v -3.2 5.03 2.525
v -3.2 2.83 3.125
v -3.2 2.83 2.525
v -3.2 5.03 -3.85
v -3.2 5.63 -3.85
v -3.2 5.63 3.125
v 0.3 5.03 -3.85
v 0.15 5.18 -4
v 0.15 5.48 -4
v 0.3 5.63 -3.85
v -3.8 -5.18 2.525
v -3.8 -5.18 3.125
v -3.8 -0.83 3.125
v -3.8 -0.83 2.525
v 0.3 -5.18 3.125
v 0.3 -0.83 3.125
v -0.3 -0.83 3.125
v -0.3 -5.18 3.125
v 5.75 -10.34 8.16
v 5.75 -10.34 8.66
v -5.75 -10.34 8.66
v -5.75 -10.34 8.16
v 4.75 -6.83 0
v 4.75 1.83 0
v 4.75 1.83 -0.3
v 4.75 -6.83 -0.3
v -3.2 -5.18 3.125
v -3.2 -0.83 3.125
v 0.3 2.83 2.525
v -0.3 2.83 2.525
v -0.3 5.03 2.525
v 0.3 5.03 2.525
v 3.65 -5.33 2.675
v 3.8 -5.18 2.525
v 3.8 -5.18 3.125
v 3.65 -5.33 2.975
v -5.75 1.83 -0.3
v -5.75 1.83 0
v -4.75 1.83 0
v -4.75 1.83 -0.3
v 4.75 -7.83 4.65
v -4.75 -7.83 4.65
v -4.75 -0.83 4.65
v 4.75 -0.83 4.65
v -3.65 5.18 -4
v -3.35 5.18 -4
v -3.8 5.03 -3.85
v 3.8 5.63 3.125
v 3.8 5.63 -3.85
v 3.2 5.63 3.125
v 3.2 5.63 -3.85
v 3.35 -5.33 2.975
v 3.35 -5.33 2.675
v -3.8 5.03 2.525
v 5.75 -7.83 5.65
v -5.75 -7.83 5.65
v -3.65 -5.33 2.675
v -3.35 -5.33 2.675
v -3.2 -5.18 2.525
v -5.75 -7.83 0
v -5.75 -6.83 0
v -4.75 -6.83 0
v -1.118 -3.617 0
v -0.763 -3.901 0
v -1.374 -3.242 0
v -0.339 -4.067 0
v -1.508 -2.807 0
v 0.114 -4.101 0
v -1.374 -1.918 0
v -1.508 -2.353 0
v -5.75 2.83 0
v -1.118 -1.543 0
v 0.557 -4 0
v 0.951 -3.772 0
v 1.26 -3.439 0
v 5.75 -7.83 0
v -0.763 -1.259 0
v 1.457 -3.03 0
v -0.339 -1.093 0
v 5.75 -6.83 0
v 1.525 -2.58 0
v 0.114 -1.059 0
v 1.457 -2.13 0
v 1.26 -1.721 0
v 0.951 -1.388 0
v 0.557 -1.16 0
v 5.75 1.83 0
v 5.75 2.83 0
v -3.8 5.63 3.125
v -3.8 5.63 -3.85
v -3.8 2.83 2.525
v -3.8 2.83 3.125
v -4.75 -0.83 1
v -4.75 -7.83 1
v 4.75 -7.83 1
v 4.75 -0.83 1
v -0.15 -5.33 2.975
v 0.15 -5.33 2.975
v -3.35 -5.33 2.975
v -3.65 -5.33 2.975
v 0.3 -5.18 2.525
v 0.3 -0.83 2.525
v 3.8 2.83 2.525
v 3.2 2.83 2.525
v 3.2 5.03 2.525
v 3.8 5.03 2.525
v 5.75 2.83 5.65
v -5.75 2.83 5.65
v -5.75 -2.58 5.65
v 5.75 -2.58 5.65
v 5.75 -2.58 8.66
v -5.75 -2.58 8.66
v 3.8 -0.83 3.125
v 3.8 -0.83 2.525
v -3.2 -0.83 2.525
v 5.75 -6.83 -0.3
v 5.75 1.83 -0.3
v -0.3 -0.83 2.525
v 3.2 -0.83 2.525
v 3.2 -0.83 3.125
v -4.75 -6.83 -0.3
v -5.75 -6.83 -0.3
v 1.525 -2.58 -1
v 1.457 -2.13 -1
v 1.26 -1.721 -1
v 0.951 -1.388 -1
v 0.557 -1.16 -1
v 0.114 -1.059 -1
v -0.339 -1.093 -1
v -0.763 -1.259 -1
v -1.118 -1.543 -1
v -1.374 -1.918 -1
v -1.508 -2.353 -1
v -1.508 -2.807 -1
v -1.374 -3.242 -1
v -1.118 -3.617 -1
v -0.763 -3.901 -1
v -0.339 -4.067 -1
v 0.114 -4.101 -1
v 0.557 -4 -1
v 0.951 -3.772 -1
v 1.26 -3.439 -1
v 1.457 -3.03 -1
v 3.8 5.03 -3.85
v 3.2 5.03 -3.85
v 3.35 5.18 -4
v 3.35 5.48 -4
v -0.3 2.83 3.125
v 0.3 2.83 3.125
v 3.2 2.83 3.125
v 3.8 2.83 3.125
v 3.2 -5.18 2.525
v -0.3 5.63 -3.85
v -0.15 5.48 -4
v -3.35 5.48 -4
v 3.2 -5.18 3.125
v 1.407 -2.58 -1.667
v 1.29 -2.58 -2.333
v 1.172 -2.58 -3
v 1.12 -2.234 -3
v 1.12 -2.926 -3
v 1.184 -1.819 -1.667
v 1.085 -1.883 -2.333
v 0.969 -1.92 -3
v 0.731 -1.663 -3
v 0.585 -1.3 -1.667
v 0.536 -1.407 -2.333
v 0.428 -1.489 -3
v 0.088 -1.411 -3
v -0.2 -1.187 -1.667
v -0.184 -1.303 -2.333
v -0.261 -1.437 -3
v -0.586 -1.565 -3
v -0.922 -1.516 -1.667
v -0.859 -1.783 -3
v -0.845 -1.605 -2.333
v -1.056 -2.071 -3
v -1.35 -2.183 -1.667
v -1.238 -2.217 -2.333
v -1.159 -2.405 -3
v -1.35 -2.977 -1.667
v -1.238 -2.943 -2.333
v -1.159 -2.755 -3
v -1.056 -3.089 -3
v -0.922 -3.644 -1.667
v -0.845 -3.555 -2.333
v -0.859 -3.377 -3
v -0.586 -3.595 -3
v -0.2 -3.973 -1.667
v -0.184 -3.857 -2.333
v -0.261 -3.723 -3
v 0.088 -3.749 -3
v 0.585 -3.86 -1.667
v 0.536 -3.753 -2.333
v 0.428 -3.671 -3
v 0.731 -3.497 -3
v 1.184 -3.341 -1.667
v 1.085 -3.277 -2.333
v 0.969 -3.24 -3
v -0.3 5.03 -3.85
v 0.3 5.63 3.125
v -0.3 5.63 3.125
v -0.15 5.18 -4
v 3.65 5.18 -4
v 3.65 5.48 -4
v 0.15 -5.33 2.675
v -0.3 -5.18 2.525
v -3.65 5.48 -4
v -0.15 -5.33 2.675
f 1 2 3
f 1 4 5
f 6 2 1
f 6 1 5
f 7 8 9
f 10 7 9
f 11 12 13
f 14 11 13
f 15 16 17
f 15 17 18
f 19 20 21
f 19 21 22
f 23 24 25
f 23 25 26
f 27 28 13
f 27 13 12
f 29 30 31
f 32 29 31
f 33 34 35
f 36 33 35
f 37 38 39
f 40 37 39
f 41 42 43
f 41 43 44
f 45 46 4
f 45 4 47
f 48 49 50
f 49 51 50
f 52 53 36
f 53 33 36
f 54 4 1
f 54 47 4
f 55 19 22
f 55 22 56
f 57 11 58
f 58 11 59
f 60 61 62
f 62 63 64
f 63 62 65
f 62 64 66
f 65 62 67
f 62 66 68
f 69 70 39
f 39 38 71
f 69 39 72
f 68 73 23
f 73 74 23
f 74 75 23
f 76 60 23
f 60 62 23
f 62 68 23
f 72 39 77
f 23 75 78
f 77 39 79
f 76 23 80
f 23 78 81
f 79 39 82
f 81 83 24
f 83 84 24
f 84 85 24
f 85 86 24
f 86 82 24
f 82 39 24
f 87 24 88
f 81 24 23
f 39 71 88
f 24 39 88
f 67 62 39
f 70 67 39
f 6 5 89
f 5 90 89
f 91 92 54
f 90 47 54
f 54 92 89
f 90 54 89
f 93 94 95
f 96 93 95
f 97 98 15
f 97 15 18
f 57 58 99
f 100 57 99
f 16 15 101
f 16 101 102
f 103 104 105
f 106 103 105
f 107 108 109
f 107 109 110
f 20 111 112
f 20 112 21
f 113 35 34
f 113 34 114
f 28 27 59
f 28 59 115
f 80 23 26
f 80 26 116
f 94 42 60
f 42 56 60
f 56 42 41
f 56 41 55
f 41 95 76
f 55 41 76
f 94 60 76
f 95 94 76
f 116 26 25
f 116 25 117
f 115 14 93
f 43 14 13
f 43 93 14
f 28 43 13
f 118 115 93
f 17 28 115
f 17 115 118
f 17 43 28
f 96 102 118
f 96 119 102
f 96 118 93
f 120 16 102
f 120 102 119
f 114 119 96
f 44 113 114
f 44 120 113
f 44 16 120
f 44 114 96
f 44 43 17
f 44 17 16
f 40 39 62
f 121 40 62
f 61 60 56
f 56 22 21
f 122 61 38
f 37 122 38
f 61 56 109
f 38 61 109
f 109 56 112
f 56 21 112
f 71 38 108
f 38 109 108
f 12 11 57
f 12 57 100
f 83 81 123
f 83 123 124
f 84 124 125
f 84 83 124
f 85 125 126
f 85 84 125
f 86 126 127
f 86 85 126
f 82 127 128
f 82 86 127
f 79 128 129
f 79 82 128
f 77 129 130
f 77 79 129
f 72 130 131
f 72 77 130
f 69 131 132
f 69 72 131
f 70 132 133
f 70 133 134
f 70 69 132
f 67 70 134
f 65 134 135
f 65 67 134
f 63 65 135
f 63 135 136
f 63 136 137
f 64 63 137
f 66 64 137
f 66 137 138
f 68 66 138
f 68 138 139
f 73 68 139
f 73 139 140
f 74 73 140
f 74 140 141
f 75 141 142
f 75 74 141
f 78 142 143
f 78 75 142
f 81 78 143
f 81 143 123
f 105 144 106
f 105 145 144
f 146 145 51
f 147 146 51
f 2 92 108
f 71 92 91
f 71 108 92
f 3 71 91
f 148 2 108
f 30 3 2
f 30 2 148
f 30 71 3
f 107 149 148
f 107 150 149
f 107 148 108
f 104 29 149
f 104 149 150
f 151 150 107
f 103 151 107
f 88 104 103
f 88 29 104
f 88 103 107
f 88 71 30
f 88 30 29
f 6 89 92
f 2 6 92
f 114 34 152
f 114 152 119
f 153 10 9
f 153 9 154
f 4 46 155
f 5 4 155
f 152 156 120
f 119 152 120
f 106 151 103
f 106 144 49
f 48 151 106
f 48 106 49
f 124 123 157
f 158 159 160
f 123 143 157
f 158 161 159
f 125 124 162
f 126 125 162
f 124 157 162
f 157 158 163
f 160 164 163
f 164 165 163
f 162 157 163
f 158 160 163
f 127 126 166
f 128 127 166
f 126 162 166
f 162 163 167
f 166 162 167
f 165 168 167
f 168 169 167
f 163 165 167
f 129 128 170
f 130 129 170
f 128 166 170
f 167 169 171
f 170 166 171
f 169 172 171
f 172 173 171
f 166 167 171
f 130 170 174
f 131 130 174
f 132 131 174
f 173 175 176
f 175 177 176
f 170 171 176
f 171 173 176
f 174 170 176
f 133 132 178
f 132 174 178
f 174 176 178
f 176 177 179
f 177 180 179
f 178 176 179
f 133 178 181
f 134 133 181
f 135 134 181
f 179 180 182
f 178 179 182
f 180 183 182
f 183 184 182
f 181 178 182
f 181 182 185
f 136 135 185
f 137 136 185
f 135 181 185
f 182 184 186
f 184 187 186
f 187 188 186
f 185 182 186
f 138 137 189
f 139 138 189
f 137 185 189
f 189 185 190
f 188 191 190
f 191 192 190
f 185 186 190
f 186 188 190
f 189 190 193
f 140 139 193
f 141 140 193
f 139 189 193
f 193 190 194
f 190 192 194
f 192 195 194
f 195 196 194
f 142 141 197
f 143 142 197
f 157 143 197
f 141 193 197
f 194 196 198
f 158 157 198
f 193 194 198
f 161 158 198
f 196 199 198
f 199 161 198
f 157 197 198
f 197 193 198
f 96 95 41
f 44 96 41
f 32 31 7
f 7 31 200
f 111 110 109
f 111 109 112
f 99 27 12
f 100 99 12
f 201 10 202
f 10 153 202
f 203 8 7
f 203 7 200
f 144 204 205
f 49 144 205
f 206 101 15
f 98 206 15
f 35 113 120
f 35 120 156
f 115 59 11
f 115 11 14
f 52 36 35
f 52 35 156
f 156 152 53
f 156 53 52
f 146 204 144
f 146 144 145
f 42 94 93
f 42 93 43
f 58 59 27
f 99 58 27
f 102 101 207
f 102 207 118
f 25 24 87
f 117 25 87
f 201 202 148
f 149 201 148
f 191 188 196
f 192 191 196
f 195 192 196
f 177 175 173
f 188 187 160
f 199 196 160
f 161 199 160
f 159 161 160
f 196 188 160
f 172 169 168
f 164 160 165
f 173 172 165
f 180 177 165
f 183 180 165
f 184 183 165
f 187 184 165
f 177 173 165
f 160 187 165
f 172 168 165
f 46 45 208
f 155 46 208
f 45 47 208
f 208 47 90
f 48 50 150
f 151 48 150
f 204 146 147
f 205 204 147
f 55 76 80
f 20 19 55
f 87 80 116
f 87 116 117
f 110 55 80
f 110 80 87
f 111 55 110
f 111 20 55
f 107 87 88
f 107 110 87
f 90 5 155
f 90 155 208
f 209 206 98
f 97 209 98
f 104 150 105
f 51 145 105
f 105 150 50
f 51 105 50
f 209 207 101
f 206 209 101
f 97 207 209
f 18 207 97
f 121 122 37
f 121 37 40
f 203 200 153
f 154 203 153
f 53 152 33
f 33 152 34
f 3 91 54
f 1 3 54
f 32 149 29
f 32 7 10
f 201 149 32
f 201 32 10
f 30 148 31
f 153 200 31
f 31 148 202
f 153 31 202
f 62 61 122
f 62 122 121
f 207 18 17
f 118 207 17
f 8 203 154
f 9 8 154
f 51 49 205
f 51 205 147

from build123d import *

# Parameters (mm, degrees)
F0_W           = 11.5
F0_H           = 10.66
F0_R           = 1.525
F1_DEPTH       = 5.65
F2_DEPTH       = 3
F3_SIZE2       = 0.3526539614
F3_SIZE        = 2
F4_W           = 9.5
F4_H           = 3.65
F5_DEPTH       = 7
F7_W           = 4.5
F7_H           = 0.6
F7_W_2         = 0.6
F7_H_2         = 4
F7_H_3         = 2.525
F7_W_3         = 5.86
F8_DEPTH       = 0.3
F8_DEPTH_BACK  = 0.3
F10_W          = 10.36
F10_H          = 0.6
F10_W_2        = 0.6
F10_H_2        = 6.525
F11_DEPTH      = 0.3
F11_DEPTH_BACK = 0.3
F13_W          = 10.36
F13_H          = 0.6
F13_W_2        = 0.6
F13_H_2        = 6.525
F14_DEPTH      = 0.3
F14_DEPTH_BACK = 0.3
F15_SIZE       = 0.15
F16_W          = 1
F16_H          = 8.66
F17_DEPTH      = 0.3
F19_DEPTH      = 11.5


with BuildPart() as f1:
    # F0 (on Top) → F1 (new body)
    with BuildSketch(Plane.XY):
        with Locations((0, -2.5)):
            Rectangle(F0_W, F0_H)
        with Locations((0, -2.58)):
            Circle(F0_R, mode=Mode.SUBTRACT)
        with Locations((0, -2.58)):
            Circle(F0_R)
    extrude(amount=F1_DEPTH)

    # F0 (on Top) → F2 (join)
    with BuildSketch(Plane.XY):
        with Locations((0, -2.58)):
            Circle(F0_R)
    extrude(amount=-F2_DEPTH)

    # F3
    f3_edges = [f1.edges().sort_by_distance(p)[0] for p in [
        (-1.525, -2.58, -3),
    ]]
    f3_side = f1.faces().sort_by_distance((-1.525, -2.58, -1.5))[0]
    chamfer(f3_edges, length=F3_SIZE, length2=F3_SIZE2, reference=f3_side)

    # F4 (on face) → F5 (cut)
    with BuildSketch(Plane.XZ.offset(7.83)):
        with Locations((0, 2.825)):
            Rectangle(F4_W, F4_H)
    extrude(amount=-F5_DEPTH, mode=Mode.SUBTRACT)

    # F7 (on mid) → F8 (join, two sides)
    with BuildSketch(Plane.YZ) as f8_sk:
        with Locations((-3.08, 2.825)):
            Rectangle(F7_W, F7_H)
        with Locations((5.33, 2.825)):
            Rectangle(F7_W_2, F7_H)
        with Locations((5.33, -2)):
            Rectangle(F7_W_2, F7_H_2)
        with Locations((5.33, 1.2625)):
            Rectangle(F7_W_2, F7_H_3)
        with Locations((2.1, 2.825)):
            Rectangle(F7_W_3, F7_H)
    extrude(amount=F8_DEPTH)
    extrude(f8_sk.sketch, amount=-F8_DEPTH_BACK)

    # F10 (on offset) → F11 (join, two sides)
    with BuildSketch(Plane.YZ.offset(3.5)) as f11_sk:
        with Locations((-0.15, 2.825)):
            Rectangle(F10_W, F10_H)
        with Locations((5.33, 2.825)):
            Rectangle(F10_W_2, F10_H)
        with Locations((5.33, -0.7375)):
            Rectangle(F10_W_2, F10_H_2)
    extrude(amount=F11_DEPTH)
    extrude(f11_sk.sketch, amount=-F11_DEPTH_BACK)

    # F13 (on offset) → F14 (join, two sides)
    with BuildSketch(Plane.YZ.offset(-3.5)) as f14_sk:
        with Locations((-0.15, 2.825)):
            Rectangle(F13_W, F13_H)
        with Locations((5.33, 2.825)):
            Rectangle(F13_W_2, F13_H)
        with Locations((5.33, -0.7375)):
            Rectangle(F13_W_2, F13_H_2)
    extrude(amount=F14_DEPTH)
    extrude(f14_sk.sketch, amount=-F14_DEPTH_BACK)

    # F15
    f15_edges = [f1.edges().sort_by_distance(p)[0] for p in [
        (-3.5, 5.03, -4),
        (-3.8, 5.33, -4),
        (-3.5, 5.63, -4),
        (-3.2, 5.33, -4),
        (-0.3, 5.33, -4),
        (0, 5.03, -4),
        (0.3, 5.33, -4),
        (0, 5.63, -4),
        (3.5, 5.03, -4),
        (3.2, 5.33, -4),
        (3.8, 5.33, -4),
        (3.5, 5.63, -4),
        (-3.2, -5.33, 2.825),
        (-3.5, -5.33, 3.125),
        (-3.8, -5.33, 2.825),
        (-3.5, -5.33, 2.525),
        (0, -5.33, 3.125),
        (-0.3, -5.33, 2.825),
        (0.3, -5.33, 2.825),
        (0, -5.33, 2.525),
        (3.2, -5.33, 2.825),
        (3.5, -5.33, 3.125),
        (3.8, -5.33, 2.825),
        (3.5, -5.33, 2.525),
    ]]
    chamfer(f15_edges, length=F15_SIZE)

    # F16 (on face) → F17 (join)
    with BuildSketch(Plane(origin=(0, 0, 0), x_dir=(1, 0, 0), z_dir=(0, 0, -1))):
        with Locations((5.25, 2.5)):
            Rectangle(F16_W, F16_H)
        with Locations((-5.25, 2.5)):
            Rectangle(F16_W, F16_H)
    extrude(amount=F17_DEPTH)

    # F18 (on face) → F19 (join, through all)
    with BuildSketch(Plane.YZ.offset(5.75)):
        Polygon((-10.34, 8.16), (-7.83, 5.65), (-2.58, 5.65), (-2.58, 8.66), (-10.34, 8.66), align=None)
    extrude(amount=-F19_DEPTH)


solid = f1.part
